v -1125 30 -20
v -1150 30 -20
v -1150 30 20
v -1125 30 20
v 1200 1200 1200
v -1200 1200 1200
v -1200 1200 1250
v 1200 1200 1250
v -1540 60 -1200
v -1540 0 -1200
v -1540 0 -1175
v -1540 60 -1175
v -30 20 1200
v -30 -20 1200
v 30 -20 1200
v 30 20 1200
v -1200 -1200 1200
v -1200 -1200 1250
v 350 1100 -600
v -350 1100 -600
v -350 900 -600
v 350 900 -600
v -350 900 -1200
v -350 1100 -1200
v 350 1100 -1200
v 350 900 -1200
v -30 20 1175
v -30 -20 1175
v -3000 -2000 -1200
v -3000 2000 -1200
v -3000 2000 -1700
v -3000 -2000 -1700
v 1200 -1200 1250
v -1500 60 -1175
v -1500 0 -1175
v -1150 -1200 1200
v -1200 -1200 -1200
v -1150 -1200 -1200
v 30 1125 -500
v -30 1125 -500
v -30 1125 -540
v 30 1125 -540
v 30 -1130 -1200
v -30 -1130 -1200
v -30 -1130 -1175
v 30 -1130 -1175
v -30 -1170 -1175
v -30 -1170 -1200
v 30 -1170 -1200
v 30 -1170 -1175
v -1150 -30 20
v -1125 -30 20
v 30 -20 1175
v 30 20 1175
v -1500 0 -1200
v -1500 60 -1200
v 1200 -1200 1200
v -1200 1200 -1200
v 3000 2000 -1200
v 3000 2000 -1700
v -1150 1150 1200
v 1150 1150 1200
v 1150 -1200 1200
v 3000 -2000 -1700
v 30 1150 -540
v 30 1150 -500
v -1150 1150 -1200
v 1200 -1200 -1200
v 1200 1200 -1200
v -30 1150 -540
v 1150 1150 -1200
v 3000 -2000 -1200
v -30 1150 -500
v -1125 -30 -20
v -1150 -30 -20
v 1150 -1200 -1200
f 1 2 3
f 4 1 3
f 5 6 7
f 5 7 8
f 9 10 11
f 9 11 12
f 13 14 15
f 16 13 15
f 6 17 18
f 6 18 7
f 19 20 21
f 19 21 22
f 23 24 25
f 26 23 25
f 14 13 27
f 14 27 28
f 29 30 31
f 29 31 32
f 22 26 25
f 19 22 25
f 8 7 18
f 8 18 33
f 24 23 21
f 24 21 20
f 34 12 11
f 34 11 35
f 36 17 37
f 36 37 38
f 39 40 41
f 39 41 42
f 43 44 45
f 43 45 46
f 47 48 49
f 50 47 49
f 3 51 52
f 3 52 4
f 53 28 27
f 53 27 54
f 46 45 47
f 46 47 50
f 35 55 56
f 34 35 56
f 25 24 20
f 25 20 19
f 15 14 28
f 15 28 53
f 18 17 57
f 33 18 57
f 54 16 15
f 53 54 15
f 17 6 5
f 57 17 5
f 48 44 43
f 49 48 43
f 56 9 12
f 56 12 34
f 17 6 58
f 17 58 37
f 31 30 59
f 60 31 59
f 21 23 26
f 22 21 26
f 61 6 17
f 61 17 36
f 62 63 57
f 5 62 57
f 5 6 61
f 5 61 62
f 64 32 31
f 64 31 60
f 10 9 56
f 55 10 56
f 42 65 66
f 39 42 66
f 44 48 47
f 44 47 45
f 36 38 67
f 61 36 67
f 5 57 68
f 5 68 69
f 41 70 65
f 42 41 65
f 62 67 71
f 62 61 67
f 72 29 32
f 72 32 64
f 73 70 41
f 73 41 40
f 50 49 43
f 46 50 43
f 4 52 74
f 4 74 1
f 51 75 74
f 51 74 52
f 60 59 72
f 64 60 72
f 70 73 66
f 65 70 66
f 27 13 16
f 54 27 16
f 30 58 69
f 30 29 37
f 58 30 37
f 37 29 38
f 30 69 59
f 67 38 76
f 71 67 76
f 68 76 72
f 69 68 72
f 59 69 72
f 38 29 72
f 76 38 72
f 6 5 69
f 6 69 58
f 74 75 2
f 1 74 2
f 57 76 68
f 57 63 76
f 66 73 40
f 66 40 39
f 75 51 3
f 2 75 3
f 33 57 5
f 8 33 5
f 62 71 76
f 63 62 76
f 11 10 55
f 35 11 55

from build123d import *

# Parameters (mm, degrees)
F1_DEPTH  = 1200
F2_W      = 2400
F2_H      = 2400
F3_DEPTH  = 50
F4_W      = 6000
F4_H      = 4000
F5_DEPTH  = 500
F6_W      = 700
F6_H      = 200
F7_DEPTH  = 600
F8_W      = 60
F8_H      = 40
F9_DEPTH  = 25
F10_W     = 60
F10_H     = 40
F11_DEPTH = 25
F12_W     = 60
F12_H     = 40
F13_DEPTH = 25
F14_W     = 60
F14_H     = 40
F15_DEPTH = 25
F16_W     = 40
F16_H     = 60
F17_DEPTH = 25


with BuildPart() as f1:
    # F0 (on Top) → F1 (new body, symmetric)
    with BuildSketch(Plane.XY):
        Polygon((1150, -1200), (1200, -1200), (1200, 1200), (-1200, 1200), (-1200, -1200), (-1150, -1200), (-1150, -1150), (-1150, 1150), (1150, 1150), (1150, -1150), align=None)
    extrude(amount=F1_DEPTH, both=True)

    # F4 (on face) → F5 (join)
    with BuildSketch(Plane(origin=(0, 0, -1200), x_dir=(1, 0, 0), z_dir=(0, 0, -1))):
        Rectangle(F4_W, F4_H)
    extrude(amount=F5_DEPTH)


with BuildPart() as f3:
    # F2 (on face) → F3 (new body)
    with BuildSketch(Plane.XY.offset(1200)):
        Rectangle(F2_W, F2_H)
    extrude(amount=F3_DEPTH)


with BuildPart() as f7:
    # F6 (on face) → F7 (new body)
    with BuildSketch(Plane.XY.offset(-1200)):
        with Locations((0, 1000)):
            Rectangle(F6_W, F6_H)
    extrude(amount=F7_DEPTH)


with BuildPart() as f9:
    # F8 (on face) → F9 (new body)
    with BuildSketch(Plane.XY.offset(-1200)):
        with Locations((0, -1150)):
            Rectangle(F8_W, F8_H)
    extrude(amount=F9_DEPTH)


with BuildPart() as f11:
    # F10 (on face) → F11 (new body)
    with BuildSketch(Plane.XZ.offset(-1150)):
        with Locations((0, -520)):
            Rectangle(F10_W, F10_H)
    extrude(amount=F11_DEPTH)


with BuildPart() as f13:
    # F12 (on face) → F13 (new body)
    with BuildSketch(Plane(origin=(0, 0, 1200), x_dir=(1, 0, 0), z_dir=(0, 0, -1))):
        Rectangle(F12_W, F12_H)
    extrude(amount=F13_DEPTH)


with BuildPart() as f15:
    # F14 (on face) → F15 (new body)
    with BuildSketch(Plane.YZ.offset(-1150)):
        Rectangle(F14_W, F14_H)
    extrude(amount=F15_DEPTH)


with BuildPart() as f17:
    # F16 (on face) → F17 (new body)
    with BuildSketch(Plane.XY.offset(-1200)):
        with Locations((-1520, 30)):
            Rectangle(F16_W, F16_H)
    extrude(amount=F17_DEPTH)


solid = Compound([f1.part, f3.part, f7.part, f9.part, f11.part, f13.part, f15.part, f17.part])
